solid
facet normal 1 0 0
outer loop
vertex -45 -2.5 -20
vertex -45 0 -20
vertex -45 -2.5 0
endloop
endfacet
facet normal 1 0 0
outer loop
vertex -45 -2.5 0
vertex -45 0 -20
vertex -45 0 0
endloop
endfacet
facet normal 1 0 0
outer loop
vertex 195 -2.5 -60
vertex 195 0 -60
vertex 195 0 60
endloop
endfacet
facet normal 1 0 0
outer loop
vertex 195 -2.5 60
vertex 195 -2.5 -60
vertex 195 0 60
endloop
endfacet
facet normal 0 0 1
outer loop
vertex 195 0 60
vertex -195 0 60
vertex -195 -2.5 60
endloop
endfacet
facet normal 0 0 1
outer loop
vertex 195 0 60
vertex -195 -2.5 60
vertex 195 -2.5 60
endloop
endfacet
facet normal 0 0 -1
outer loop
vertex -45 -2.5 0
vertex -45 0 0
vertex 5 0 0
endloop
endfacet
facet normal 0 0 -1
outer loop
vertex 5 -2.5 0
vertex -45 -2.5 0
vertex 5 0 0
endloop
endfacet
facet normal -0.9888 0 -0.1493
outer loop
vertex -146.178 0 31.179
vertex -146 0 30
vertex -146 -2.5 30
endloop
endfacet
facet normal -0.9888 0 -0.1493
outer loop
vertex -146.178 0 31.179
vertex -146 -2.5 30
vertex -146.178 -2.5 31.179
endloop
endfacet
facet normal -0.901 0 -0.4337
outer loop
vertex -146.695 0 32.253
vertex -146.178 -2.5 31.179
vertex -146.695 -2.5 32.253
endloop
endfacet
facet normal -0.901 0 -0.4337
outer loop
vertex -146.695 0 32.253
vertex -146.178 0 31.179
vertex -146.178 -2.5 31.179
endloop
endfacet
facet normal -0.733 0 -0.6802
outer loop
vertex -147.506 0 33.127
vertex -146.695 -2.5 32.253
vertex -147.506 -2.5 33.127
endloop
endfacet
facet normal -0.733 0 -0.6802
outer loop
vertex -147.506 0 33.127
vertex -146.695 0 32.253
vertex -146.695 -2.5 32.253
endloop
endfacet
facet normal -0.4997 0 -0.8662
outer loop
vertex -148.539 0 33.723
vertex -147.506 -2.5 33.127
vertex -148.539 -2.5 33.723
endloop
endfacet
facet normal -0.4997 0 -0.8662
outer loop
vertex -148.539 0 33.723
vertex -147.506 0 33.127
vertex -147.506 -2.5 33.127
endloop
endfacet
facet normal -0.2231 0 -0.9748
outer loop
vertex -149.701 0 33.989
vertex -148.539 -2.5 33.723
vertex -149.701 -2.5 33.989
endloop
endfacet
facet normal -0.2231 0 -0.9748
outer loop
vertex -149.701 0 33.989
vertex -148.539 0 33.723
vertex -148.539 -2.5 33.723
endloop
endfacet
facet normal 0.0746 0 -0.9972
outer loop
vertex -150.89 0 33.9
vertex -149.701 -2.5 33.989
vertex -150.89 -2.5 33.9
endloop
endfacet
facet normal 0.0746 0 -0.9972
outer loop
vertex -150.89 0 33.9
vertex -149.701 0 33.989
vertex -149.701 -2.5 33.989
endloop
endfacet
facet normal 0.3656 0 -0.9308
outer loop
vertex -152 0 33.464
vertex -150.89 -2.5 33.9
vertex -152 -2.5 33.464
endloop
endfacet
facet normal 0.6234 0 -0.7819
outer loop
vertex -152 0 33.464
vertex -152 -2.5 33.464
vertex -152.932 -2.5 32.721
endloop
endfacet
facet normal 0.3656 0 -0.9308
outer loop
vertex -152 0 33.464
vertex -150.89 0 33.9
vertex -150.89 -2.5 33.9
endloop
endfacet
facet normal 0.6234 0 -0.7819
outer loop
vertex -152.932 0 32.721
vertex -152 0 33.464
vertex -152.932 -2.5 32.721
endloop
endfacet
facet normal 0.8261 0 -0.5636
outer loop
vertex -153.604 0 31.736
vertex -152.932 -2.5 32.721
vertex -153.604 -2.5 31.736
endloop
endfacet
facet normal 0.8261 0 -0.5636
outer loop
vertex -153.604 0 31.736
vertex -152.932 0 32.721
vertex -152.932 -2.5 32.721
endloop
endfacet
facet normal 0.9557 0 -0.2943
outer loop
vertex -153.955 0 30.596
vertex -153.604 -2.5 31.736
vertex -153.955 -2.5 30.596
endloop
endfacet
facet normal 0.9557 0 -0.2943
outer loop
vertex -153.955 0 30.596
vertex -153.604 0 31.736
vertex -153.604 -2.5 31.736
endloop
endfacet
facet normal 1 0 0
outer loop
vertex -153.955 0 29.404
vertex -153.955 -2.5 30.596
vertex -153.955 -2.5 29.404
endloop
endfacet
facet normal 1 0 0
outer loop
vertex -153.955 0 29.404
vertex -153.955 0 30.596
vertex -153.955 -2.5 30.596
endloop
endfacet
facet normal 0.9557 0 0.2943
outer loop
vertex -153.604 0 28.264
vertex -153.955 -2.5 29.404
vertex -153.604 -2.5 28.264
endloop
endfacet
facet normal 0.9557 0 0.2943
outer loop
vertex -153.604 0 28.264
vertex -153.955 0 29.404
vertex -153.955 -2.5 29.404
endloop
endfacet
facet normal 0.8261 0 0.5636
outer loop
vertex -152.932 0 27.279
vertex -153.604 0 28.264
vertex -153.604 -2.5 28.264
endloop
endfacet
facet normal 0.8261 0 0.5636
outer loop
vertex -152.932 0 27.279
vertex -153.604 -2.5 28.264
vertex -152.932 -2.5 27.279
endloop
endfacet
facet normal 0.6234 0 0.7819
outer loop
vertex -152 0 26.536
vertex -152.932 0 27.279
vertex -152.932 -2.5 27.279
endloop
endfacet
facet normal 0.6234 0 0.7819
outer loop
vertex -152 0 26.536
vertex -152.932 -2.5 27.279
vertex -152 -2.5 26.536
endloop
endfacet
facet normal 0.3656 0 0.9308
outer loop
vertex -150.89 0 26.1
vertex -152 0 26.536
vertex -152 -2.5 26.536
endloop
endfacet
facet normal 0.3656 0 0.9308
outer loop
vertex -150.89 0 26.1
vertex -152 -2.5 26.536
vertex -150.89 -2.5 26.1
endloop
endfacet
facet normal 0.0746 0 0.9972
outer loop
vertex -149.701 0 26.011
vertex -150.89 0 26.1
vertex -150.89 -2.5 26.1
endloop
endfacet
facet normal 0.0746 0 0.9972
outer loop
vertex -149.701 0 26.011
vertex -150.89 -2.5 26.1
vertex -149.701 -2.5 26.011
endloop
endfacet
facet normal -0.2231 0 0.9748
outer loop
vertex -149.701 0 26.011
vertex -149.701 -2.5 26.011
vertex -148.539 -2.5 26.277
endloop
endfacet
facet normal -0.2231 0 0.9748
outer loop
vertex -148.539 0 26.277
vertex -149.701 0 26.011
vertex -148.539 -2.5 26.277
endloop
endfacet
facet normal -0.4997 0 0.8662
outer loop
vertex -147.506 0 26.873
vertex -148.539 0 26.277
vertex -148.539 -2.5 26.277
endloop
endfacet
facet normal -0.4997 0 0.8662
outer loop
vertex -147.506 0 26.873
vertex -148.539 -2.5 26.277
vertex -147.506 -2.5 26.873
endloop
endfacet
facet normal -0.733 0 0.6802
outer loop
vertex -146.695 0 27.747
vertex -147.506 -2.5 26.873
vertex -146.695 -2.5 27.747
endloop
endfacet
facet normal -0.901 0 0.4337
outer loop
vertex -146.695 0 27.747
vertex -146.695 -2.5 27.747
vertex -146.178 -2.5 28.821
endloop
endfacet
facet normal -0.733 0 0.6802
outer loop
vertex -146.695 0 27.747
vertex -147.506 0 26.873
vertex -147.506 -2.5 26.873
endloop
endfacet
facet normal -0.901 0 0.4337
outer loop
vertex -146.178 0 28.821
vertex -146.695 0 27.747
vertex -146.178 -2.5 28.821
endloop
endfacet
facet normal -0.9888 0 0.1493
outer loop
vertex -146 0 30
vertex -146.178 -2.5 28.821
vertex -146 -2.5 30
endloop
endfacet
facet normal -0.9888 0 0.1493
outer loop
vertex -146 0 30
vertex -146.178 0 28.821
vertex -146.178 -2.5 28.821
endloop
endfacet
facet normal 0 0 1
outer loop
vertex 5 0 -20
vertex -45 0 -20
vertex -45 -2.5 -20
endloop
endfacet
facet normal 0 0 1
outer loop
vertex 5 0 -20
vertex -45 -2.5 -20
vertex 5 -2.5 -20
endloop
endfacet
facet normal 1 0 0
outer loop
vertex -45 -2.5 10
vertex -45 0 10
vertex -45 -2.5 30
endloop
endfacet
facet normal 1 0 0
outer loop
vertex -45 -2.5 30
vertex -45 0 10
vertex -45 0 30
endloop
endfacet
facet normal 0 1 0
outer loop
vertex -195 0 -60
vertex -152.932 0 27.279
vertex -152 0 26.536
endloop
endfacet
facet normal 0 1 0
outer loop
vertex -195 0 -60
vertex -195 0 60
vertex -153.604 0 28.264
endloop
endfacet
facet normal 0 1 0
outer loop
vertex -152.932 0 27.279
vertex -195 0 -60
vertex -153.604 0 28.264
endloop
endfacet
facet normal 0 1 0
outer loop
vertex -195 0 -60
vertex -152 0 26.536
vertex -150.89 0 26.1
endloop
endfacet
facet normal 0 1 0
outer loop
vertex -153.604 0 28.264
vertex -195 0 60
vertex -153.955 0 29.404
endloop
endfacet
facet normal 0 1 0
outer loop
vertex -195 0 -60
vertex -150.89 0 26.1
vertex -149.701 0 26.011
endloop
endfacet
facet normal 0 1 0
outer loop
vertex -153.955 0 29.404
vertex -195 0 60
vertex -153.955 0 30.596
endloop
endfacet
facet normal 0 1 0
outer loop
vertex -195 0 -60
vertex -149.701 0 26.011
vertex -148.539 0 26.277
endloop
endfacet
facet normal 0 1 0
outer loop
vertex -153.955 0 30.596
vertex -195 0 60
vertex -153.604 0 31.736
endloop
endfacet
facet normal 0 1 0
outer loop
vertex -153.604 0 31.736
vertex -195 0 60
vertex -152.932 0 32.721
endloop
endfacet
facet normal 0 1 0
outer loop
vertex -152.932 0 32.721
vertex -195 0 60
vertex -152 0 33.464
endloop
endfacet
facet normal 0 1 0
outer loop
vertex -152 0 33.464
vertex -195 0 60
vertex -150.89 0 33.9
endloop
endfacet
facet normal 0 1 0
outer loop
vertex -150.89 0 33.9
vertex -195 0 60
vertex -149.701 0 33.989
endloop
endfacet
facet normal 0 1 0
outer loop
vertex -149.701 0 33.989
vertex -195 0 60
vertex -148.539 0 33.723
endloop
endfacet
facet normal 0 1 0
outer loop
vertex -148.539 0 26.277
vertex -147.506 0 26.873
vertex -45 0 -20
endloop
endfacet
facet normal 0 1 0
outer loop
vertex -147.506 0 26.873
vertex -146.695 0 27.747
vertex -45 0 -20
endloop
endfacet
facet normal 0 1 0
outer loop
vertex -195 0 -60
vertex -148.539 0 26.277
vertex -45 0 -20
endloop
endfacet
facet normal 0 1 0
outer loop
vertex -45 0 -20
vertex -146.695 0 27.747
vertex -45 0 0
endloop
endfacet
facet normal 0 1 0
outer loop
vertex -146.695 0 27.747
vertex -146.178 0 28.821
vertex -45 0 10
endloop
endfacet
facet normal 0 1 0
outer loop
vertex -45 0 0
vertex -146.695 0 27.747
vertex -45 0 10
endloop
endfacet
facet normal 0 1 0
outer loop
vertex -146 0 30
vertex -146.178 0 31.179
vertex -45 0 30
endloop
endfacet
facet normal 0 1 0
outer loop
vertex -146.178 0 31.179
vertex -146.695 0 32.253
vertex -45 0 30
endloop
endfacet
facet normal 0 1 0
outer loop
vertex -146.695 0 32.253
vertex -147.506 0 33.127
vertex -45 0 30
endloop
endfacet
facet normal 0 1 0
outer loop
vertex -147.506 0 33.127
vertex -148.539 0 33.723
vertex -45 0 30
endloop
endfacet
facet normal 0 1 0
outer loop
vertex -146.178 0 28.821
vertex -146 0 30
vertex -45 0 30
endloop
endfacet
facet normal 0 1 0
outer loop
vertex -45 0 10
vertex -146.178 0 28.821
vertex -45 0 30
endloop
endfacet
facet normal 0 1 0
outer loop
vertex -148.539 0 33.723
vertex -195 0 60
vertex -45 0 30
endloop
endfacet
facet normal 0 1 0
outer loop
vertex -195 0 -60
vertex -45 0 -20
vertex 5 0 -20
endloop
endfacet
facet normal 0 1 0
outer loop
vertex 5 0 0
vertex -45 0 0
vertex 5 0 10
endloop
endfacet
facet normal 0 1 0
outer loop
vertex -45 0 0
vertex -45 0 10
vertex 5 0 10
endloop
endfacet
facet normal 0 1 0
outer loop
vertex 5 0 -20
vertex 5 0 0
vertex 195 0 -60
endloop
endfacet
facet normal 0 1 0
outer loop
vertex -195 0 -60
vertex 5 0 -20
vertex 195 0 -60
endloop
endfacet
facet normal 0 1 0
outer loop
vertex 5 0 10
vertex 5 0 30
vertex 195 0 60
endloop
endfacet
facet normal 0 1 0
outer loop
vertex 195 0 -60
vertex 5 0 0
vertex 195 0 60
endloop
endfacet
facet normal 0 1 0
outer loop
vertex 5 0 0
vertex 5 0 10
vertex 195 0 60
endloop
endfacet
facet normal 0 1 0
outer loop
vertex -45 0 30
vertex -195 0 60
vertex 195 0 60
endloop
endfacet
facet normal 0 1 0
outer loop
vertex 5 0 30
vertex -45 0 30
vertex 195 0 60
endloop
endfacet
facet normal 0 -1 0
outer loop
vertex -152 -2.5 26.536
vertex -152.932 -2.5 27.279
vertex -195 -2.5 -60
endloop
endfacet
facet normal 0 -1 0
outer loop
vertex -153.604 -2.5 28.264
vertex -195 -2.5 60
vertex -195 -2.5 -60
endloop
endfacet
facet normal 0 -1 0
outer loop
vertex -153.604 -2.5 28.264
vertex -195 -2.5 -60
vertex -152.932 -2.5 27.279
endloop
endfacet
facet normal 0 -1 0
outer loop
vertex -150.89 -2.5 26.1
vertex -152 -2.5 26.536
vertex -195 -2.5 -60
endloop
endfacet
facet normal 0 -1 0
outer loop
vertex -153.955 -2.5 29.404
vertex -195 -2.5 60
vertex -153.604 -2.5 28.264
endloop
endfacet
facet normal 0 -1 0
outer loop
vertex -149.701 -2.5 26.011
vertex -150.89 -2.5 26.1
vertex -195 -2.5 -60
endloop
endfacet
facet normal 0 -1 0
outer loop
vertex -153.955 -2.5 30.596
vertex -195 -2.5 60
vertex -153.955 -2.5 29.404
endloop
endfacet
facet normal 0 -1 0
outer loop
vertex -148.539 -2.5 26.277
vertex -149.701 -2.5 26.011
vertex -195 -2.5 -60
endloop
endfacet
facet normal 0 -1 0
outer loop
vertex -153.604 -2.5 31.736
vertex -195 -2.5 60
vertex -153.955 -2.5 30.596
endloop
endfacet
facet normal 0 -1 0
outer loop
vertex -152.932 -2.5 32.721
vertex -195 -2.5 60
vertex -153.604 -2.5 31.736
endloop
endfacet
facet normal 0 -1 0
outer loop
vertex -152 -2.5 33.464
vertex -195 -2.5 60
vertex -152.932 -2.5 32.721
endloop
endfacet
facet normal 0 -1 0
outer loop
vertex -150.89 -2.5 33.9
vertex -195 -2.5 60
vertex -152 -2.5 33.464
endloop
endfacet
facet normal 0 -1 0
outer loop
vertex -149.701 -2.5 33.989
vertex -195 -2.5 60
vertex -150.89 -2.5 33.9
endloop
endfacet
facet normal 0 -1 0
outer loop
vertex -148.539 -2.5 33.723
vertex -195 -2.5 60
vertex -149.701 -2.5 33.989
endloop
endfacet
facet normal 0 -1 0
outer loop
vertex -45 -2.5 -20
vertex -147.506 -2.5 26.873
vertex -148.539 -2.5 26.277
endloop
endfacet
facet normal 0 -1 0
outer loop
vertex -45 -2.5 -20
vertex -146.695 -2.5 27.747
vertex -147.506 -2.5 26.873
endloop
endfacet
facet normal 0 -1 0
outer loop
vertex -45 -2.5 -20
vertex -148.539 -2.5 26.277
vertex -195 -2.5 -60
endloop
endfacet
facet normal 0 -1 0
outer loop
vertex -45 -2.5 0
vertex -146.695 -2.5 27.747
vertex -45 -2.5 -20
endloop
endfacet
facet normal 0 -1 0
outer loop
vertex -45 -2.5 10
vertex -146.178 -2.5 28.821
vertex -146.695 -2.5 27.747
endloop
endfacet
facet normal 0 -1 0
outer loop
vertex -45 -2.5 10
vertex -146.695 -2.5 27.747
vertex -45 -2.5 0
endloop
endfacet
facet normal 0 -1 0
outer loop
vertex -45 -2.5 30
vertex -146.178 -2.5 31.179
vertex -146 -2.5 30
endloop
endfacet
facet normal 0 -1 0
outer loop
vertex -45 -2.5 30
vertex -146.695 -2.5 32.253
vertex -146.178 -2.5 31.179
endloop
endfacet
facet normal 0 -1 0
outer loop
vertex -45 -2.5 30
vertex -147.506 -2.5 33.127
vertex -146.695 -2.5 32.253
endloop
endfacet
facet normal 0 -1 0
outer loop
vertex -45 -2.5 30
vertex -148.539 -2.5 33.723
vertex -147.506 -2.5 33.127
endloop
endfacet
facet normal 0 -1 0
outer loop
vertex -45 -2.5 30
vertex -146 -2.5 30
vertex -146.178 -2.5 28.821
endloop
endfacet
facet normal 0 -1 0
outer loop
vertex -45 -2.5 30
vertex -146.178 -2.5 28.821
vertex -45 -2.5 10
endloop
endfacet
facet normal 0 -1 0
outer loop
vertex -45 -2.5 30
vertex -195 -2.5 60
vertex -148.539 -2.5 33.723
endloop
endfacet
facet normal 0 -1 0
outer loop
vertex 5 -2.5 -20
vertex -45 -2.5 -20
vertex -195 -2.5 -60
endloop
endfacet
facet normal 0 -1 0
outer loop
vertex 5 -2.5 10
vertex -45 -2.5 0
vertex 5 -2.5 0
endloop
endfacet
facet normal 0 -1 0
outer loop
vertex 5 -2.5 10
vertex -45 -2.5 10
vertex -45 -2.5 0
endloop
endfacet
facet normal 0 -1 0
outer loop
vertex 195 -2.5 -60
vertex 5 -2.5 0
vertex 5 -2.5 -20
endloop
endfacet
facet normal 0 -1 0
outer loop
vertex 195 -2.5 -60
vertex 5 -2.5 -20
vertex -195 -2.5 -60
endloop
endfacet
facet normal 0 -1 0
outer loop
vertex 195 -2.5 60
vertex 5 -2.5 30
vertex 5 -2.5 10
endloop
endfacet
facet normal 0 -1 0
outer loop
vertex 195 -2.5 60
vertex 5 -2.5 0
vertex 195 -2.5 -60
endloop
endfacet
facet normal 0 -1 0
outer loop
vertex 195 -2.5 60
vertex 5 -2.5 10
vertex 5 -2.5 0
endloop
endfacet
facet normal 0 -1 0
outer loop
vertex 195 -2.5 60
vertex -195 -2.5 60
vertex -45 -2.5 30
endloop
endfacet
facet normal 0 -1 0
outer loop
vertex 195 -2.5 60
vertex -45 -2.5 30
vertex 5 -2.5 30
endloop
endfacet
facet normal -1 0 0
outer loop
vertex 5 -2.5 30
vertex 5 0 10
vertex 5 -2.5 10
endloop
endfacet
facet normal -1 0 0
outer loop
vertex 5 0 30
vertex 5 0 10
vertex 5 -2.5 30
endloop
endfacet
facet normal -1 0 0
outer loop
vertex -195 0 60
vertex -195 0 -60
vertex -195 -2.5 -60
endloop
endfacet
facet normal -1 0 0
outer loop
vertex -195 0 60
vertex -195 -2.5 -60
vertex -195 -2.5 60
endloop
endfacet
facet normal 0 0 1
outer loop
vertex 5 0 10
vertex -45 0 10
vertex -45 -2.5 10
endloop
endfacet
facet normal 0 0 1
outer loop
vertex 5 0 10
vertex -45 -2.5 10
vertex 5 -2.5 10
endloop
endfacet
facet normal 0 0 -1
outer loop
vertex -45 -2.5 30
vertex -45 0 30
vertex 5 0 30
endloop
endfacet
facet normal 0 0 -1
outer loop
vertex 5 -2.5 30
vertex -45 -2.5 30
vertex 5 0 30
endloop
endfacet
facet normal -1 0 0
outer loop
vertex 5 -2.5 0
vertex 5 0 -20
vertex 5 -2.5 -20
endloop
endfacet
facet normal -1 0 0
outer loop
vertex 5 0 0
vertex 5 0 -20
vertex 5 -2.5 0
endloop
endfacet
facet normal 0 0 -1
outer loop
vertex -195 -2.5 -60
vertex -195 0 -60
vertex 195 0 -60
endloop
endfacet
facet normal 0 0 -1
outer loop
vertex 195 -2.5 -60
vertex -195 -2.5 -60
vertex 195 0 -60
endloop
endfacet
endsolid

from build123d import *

# Parameters (mm, degrees)
F0_W     = 390
F0_H     = 120
F0_W_2   = 50
F0_H_2   = 20
F0_R     = 4
F1_DEPTH = 2.5


with BuildPart() as f1:
    # F0 (on Front) → F1 (new body)
    with BuildSketch(Plane.XZ):
        Rectangle(F0_W, F0_H)
        with Locations((-20, -10)):
            Rectangle(F0_W_2, F0_H_2, mode=Mode.SUBTRACT)
        with Locations((-20, 20)):
            Rectangle(F0_W_2, F0_H_2, mode=Mode.SUBTRACT)
        with Locations((-150, 30)):
            Circle(F0_R, mode=Mode.SUBTRACT)
    extrude(amount=F1_DEPTH)


solid = f1.part
